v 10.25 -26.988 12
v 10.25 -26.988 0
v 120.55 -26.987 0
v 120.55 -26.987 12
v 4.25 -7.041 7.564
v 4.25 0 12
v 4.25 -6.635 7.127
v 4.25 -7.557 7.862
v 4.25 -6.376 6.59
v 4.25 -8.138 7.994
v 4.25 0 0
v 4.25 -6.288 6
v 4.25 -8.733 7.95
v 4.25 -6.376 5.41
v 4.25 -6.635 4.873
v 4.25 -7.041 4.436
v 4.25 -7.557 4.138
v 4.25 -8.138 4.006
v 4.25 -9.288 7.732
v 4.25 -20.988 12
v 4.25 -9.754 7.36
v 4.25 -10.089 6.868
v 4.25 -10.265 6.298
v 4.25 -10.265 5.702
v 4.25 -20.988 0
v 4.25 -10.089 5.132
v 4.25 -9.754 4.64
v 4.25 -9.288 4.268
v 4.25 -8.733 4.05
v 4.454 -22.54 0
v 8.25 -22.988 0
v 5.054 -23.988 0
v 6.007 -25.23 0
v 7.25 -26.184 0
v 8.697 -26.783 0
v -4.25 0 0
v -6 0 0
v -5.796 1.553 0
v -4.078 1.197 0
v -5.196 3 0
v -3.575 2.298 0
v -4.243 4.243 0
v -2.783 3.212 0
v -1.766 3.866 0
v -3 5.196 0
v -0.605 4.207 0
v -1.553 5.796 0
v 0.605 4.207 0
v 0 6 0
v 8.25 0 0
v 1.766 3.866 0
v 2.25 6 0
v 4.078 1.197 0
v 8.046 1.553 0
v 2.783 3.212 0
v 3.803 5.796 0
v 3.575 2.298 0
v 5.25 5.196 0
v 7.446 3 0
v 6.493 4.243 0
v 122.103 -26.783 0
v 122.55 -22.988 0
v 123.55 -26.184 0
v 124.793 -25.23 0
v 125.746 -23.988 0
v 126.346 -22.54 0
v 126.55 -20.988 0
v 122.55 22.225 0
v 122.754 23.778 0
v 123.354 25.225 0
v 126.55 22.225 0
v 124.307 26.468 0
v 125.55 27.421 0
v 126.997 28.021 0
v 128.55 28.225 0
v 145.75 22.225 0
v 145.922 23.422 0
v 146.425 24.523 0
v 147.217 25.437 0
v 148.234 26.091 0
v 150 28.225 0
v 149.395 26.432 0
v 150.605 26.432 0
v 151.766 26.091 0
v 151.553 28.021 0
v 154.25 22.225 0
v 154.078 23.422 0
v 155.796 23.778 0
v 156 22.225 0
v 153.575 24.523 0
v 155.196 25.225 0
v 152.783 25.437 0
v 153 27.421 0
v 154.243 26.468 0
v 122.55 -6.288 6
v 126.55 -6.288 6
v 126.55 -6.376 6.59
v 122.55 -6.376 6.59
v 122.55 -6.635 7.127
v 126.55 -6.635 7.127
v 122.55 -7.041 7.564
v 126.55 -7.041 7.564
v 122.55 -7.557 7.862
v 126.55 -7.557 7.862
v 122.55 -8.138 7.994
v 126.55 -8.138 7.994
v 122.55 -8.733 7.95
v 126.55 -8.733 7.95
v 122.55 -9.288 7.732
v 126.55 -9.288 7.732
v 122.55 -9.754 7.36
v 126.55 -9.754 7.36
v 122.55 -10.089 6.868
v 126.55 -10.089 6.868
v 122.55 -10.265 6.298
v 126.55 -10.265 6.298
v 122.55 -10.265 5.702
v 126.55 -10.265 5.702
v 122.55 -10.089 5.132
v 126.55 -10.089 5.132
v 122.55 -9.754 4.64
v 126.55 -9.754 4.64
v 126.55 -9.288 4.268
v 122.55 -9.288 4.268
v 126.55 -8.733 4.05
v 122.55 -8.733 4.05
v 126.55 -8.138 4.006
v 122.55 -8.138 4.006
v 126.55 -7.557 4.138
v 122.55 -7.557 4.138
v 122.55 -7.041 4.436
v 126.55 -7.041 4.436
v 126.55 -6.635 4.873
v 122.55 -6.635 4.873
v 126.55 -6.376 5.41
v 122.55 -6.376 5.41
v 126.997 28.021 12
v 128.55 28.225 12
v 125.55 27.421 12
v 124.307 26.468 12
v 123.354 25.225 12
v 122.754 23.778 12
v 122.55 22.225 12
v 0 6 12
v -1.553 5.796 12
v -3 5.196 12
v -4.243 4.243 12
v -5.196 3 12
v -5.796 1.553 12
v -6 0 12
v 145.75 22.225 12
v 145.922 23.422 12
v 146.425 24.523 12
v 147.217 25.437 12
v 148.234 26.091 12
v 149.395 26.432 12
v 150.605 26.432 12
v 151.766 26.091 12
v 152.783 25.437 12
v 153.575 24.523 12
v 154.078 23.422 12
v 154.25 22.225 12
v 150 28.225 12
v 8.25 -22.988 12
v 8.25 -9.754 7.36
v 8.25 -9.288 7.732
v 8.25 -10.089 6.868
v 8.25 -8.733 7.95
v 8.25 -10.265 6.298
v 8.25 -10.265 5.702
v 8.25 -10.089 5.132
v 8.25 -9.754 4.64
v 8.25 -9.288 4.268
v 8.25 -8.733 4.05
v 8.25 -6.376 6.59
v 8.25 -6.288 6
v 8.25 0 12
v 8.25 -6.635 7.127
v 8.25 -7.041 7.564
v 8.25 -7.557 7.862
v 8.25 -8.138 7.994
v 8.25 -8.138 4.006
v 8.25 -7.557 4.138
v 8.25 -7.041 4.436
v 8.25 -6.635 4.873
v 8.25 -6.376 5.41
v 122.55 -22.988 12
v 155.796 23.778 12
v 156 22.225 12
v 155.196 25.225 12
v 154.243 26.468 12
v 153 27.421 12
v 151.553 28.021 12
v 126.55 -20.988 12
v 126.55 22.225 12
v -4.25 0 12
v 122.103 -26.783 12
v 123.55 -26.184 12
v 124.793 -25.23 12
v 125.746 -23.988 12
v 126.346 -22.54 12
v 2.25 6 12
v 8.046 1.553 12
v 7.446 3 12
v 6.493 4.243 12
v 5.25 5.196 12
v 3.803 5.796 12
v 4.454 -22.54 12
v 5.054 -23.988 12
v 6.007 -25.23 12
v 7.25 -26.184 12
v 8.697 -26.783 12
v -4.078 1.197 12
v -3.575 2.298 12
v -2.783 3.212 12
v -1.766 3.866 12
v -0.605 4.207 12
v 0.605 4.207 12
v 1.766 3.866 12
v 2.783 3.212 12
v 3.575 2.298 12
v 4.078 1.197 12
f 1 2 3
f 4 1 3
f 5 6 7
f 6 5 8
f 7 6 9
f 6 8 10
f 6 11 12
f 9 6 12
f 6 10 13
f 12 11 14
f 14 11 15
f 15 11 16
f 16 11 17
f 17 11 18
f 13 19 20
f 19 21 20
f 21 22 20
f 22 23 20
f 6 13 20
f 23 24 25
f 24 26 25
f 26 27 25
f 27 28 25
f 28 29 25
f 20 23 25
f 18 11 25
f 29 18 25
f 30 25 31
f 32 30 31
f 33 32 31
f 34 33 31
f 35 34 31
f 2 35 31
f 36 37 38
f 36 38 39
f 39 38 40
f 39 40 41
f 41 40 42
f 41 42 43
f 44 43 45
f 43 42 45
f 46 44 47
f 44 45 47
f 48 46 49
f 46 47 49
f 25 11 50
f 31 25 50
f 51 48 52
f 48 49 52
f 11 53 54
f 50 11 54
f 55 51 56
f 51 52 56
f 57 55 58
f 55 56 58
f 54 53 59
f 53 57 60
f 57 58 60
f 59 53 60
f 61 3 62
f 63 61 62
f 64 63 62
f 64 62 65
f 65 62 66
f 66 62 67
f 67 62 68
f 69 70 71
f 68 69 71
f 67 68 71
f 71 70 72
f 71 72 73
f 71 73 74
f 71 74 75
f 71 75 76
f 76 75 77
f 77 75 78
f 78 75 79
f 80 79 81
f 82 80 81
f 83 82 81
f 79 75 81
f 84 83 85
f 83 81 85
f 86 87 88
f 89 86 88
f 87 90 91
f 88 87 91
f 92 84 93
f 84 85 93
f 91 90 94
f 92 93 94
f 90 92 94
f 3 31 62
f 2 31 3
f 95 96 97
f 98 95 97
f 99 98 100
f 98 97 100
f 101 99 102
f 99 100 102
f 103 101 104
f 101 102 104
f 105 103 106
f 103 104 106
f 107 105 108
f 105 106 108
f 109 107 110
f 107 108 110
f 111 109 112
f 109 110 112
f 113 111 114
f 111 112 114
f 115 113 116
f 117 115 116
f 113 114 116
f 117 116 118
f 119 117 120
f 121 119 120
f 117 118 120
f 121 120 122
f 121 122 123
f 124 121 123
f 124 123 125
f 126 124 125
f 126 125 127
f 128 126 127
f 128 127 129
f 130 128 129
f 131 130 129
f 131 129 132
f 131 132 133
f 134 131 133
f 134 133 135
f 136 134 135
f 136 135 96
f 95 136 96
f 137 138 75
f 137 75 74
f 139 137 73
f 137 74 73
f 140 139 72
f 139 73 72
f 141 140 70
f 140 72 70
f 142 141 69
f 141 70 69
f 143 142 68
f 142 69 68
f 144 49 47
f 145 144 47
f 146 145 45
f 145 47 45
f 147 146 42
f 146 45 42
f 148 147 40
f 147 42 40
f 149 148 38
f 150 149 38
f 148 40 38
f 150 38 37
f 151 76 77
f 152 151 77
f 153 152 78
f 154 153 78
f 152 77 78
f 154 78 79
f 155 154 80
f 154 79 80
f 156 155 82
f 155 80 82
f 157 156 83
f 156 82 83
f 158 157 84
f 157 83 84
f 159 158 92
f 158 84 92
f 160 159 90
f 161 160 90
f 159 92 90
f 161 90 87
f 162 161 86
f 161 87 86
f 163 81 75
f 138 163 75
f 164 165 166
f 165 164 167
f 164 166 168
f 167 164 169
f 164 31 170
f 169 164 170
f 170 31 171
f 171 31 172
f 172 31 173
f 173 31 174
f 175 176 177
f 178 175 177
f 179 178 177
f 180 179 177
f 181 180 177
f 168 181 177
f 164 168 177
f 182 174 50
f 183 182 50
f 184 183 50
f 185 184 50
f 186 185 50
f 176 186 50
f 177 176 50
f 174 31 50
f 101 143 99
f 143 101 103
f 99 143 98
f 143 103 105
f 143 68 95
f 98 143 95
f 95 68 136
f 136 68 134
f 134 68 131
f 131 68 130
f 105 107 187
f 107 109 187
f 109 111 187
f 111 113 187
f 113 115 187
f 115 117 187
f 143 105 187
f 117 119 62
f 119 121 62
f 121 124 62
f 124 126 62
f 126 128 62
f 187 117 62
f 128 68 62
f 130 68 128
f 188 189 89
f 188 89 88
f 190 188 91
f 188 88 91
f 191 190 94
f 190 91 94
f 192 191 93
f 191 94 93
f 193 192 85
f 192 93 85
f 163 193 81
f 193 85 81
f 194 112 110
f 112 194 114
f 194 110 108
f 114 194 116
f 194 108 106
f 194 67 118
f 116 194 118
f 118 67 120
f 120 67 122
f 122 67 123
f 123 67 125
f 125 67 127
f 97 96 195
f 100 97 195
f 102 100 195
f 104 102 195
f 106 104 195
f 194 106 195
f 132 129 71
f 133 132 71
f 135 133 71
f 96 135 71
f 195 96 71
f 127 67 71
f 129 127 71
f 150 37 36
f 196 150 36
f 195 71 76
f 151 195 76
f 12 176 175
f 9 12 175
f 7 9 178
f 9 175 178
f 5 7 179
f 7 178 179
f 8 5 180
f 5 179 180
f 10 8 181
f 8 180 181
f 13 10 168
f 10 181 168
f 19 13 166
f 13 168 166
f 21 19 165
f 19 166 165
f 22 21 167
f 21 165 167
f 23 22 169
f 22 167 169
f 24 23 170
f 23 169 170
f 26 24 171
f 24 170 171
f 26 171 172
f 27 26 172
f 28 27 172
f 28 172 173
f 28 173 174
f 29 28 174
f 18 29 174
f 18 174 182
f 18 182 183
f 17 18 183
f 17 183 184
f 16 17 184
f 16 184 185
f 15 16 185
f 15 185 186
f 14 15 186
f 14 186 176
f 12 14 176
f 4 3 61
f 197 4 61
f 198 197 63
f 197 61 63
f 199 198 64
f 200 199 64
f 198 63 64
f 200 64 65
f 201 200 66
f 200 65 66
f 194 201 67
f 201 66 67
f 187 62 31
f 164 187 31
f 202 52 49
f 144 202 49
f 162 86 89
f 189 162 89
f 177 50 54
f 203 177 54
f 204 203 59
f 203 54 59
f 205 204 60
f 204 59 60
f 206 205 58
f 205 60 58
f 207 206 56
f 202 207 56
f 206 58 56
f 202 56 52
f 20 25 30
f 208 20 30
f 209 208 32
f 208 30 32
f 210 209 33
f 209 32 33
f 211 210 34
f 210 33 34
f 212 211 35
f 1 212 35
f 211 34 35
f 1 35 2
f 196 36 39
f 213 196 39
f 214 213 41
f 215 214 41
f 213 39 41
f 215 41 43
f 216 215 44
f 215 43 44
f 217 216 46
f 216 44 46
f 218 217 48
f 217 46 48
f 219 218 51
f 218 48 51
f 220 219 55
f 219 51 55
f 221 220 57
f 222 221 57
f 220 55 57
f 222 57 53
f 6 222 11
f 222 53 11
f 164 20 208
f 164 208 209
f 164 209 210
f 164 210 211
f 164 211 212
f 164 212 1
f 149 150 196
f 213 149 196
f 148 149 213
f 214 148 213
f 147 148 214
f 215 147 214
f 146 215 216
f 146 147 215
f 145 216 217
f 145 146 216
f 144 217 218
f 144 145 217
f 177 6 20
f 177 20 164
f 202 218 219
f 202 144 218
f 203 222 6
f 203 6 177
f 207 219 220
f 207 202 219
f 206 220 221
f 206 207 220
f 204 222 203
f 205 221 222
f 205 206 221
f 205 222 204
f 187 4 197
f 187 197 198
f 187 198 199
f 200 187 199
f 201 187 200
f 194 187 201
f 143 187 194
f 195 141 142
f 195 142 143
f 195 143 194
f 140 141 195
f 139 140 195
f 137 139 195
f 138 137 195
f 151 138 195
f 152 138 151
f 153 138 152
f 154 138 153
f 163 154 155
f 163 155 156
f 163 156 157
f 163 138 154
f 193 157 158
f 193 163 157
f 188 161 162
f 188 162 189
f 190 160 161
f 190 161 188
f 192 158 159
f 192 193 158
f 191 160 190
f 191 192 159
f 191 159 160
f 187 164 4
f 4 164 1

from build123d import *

# Parameters (mm, degrees)
F1_DEPTH = 12
F2_R     = 2
F3_DEPTH = 132.551


with BuildPart() as f1:
    # F0 (on Top) → F1 (new body)
    with BuildSketch(Plane.XY):
        with BuildLine():
            ThreePointArc((-4.25, 0), (0, 4.25), (4.25, 0))
            Line((4.25, 0), (4.25, -20.9875))
            ThreePointArc((4.25, -20.9875), (6.007359, -25.230141), (10.25, -26.9875))
            Line((10.25, -26.9875), (120.55, -26.9875))
            ThreePointArc((120.55, -26.9875), (124.792641, -25.230141), (126.55, -20.9875))
            Line((126.55, -20.9875), (126.55, 22.225))
            Line((126.55, 22.225), (145.75, 22.225))
            ThreePointArc((145.75, 22.225), (150, 26.475), (154.25, 22.225))
            Line((154.25, 22.225), (156, 22.225))
            ThreePointArc((156, 22.225), (154.242641, 26.467641), (150, 28.225))
            Line((150, 28.225), (128.55, 28.225))
            ThreePointArc((128.55, 28.225), (124.307359, 26.467641), (122.55, 22.225))
            Line((122.55, 22.225), (122.55, -22.9875))
            Line((122.55, -22.9875), (8.25, -22.9875))
            Line((8.25, -22.9875), (8.25, 0))
            ThreePointArc((8.25, 0), (6.492641, 4.242641), (2.25, 6))
            Line((2.25, 6), (0, 6))
            ThreePointArc((0, 6), (-4.242641, 4.242641), (-6, 0))
            Line((-6, 0), (-4.25, 0))
        make_face()
    extrude(amount=F1_DEPTH)

    # F2 (on face) → F3 (cut, through all)
    with BuildSketch(Plane.YZ.offset(126.55)):
        with Locations((-8.2875, 6)):
            Circle(F2_R)
    extrude(amount=-F3_DEPTH, mode=Mode.SUBTRACT)


solid = f1.part
